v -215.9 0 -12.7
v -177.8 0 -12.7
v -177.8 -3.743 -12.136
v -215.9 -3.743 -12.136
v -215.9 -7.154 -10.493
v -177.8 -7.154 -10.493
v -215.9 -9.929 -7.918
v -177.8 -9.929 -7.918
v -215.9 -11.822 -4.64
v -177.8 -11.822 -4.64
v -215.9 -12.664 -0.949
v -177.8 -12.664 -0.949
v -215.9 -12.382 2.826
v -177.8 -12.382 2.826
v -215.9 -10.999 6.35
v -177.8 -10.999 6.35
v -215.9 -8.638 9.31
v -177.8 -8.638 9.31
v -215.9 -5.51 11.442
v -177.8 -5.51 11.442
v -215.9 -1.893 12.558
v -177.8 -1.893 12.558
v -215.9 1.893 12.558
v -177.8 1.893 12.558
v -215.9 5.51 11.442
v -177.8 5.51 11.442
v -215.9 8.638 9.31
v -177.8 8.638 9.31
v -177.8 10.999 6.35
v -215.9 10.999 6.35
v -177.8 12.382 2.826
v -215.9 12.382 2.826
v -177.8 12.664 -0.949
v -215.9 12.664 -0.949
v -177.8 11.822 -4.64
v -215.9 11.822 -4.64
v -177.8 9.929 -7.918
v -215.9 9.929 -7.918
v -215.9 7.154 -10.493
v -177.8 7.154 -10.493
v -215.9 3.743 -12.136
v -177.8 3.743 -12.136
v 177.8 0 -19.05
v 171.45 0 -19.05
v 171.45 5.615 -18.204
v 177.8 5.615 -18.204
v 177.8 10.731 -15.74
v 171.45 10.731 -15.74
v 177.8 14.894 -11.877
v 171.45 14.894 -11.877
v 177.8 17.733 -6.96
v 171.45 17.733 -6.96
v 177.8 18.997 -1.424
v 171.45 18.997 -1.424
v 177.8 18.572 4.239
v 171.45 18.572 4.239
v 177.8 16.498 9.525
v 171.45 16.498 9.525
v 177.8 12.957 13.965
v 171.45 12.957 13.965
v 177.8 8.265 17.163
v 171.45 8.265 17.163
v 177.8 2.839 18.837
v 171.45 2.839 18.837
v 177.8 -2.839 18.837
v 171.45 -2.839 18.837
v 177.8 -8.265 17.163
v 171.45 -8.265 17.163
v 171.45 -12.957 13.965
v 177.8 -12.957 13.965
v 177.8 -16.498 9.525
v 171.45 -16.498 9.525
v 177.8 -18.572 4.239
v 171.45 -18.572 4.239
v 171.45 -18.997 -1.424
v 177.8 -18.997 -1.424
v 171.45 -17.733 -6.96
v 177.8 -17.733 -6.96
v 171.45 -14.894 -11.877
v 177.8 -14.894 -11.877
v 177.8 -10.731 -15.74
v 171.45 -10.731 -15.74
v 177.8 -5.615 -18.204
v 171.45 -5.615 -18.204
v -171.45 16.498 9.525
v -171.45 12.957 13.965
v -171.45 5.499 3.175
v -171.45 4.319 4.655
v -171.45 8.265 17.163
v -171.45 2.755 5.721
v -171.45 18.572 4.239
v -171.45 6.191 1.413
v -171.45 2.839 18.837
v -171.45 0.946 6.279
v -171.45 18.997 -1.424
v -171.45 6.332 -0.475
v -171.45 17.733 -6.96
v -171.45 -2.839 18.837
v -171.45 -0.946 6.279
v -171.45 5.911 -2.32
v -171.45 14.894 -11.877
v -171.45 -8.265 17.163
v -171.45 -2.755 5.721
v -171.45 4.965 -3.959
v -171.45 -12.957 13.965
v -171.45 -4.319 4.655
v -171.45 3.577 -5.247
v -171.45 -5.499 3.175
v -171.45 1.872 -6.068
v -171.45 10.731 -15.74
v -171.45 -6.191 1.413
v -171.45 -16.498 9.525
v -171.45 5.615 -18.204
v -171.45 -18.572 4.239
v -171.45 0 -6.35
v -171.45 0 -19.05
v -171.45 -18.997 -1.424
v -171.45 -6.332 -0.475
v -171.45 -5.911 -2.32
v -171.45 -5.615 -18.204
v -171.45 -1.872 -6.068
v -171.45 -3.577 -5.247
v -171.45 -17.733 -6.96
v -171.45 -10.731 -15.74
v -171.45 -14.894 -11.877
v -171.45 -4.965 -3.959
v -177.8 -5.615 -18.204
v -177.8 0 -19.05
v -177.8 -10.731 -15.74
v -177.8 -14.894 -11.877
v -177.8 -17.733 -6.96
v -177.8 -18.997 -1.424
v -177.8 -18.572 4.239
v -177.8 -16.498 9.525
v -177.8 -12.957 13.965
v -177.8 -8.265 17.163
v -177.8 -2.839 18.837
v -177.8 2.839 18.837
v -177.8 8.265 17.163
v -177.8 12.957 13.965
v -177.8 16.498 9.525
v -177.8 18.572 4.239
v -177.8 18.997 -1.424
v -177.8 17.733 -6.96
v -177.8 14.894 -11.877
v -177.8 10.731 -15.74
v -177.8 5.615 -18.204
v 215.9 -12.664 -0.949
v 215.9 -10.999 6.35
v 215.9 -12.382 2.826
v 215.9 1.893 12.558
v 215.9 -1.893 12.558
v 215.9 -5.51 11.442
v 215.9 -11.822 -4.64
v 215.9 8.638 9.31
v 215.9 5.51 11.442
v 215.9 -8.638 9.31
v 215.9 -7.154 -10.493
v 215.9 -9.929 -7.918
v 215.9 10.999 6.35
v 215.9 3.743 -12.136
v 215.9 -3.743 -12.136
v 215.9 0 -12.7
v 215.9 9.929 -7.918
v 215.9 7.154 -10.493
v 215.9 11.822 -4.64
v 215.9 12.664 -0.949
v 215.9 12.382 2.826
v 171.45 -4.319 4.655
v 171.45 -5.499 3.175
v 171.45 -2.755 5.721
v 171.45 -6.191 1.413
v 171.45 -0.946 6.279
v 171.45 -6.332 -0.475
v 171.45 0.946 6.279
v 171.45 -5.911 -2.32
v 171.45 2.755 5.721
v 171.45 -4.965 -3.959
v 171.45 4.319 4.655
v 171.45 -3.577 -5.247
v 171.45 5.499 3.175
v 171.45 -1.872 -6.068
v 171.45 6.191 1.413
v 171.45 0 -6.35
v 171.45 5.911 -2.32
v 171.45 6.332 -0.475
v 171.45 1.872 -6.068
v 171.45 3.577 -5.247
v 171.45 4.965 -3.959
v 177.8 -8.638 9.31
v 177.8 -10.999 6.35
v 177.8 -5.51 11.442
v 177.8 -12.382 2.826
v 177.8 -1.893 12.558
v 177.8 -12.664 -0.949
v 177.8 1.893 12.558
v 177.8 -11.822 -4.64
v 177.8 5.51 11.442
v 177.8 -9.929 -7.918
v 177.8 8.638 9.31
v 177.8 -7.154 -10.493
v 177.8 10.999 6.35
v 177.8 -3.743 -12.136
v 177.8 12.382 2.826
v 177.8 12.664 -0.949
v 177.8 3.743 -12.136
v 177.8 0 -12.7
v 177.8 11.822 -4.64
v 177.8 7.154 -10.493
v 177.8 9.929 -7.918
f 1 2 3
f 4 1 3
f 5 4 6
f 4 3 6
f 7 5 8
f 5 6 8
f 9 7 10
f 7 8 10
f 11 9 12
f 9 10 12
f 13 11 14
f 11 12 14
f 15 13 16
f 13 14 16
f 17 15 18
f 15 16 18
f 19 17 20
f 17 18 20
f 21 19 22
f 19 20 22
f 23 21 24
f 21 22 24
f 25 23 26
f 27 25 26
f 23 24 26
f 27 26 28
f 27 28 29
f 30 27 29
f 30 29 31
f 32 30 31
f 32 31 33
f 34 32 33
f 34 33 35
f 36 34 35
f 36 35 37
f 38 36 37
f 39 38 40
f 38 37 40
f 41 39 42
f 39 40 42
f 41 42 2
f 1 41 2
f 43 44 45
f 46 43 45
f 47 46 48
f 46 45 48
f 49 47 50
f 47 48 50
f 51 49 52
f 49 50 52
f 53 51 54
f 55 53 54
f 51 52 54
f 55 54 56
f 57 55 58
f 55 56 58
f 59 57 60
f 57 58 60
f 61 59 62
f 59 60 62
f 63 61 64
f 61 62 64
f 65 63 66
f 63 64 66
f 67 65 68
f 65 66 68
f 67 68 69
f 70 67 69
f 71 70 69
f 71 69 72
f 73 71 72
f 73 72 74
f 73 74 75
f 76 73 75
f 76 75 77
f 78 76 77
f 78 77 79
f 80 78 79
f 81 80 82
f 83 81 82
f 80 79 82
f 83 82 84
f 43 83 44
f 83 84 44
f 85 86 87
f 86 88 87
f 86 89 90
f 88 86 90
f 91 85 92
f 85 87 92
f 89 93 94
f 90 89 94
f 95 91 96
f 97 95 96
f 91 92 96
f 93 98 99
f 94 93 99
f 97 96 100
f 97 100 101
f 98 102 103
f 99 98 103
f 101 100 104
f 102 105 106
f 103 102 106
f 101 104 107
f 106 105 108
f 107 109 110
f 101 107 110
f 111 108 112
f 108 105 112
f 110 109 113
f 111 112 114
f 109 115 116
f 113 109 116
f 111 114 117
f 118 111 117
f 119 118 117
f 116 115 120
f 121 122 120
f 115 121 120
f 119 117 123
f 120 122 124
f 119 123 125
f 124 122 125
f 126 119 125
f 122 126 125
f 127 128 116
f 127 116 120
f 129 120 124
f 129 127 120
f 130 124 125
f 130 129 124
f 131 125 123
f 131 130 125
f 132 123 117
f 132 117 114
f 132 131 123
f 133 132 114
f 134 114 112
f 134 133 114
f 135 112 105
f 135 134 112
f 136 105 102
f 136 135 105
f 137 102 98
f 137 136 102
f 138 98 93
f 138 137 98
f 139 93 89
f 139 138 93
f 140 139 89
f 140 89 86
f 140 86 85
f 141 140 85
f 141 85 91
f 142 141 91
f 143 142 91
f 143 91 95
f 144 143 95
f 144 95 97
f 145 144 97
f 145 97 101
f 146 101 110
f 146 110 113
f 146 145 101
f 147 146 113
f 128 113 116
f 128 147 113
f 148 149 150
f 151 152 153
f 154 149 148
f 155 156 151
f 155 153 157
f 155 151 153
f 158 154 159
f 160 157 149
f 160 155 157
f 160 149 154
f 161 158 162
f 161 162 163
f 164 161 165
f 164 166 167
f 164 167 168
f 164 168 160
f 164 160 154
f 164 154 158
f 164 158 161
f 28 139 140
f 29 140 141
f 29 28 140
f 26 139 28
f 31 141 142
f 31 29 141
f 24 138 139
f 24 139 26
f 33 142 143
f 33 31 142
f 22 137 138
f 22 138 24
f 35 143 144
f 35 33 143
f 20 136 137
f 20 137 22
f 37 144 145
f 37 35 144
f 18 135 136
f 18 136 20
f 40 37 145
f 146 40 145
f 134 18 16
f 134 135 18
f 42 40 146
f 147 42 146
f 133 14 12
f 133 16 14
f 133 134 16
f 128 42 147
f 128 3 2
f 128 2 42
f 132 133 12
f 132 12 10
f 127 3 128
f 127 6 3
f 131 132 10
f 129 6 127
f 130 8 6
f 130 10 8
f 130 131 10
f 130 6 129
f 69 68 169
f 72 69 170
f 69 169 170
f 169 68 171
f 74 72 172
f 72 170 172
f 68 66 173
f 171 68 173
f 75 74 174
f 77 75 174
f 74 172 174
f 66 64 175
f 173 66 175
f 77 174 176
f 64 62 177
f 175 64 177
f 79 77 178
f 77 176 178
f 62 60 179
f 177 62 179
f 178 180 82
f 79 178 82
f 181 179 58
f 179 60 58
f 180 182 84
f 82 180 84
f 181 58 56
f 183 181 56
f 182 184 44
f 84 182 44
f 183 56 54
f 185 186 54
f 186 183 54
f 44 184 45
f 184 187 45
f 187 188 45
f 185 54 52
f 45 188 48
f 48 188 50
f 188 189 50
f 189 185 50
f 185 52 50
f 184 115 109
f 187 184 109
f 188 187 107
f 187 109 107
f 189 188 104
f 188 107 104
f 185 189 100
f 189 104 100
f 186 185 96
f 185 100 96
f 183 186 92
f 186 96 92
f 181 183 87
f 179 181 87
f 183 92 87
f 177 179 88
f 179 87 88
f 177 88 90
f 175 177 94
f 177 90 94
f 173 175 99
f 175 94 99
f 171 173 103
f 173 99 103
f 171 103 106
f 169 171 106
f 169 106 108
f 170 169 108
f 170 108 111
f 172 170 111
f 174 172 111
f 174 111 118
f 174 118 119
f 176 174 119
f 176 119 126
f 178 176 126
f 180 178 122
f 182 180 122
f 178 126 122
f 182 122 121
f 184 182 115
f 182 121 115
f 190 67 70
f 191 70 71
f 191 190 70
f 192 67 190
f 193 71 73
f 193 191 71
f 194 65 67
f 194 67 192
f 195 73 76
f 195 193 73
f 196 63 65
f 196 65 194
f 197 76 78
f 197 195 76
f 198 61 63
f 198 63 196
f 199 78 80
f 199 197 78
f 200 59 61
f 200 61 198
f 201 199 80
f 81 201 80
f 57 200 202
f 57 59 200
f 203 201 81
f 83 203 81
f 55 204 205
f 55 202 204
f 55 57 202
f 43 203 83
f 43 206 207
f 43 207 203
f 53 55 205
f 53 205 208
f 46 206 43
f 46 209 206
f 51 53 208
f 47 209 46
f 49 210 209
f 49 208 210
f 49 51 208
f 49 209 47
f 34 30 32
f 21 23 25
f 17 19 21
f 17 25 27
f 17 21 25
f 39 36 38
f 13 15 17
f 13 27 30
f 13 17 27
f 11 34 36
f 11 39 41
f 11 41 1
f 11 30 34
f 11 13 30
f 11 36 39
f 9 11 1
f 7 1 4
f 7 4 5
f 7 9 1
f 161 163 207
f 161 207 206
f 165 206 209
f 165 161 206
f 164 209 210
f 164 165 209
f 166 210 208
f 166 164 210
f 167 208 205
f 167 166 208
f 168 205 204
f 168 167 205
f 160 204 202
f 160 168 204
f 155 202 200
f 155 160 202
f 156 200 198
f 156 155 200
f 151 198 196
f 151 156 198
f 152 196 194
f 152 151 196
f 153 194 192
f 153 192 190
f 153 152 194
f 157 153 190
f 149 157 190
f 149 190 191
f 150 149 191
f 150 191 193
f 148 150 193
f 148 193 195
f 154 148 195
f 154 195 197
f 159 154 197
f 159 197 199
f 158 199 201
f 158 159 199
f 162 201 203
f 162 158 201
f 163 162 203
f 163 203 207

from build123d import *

# Parameters (mm, degrees)
BOSS_EXTRUDE1_DEPTH      = 171.45
BOSS_EXTRUDE1_DEPTH_BACK = 171.45
SKETCH2_R                = 6.35
SKETCH3_R                = 19.05
BOSS_EXTRUDE2_DEPTH      = 6.35
BOSS_EXTRUDE4_START      = 6.35
SKETCH7_R                = 19.05
BOSS_EXTRUDE4_DEPTH      = 6.35
SKETCH9_R                = 12.7
BOSS_EXTRUDE6_DEPTH      = 38.1
BOSS_EXTRUDE7_START      = 38.1
SKETCH10_R               = 12.7
BOSS_EXTRUDE7_DEPTH      = 38.1


with BuildPart() as part:
    # Sketch2 → Boss-Extrude1 (new, two sides: drawn at the far end of the back side and taken through both)
    with BuildSketch(Plane(origin=(0, 0, 0), x_dir=(0, 0, -1), z_dir=(1, 0, 0)).offset(-BOSS_EXTRUDE1_DEPTH_BACK)):
        Circle(SKETCH2_R)
    extrude(amount=BOSS_EXTRUDE1_DEPTH + BOSS_EXTRUDE1_DEPTH_BACK)

    # Sketch3 → Boss-Extrude2 (add)
    with BuildSketch(Plane(origin=(171.45, 0, 0), x_dir=(0, 0, -1), z_dir=(1, 0, 0))):
        Circle(SKETCH3_R)
    extrude(amount=BOSS_EXTRUDE2_DEPTH)

    # Sketch7 → Boss-Extrude4 (add)
    with BuildSketch(Plane.ZY.offset(171.45).offset(BOSS_EXTRUDE4_START)):
        Circle(SKETCH7_R)
    extrude(amount=-BOSS_EXTRUDE4_DEPTH)

    # Sketch9 → Boss-Extrude6 (add)
    with BuildSketch(Plane.ZY.offset(177.8)):
        Circle(SKETCH9_R)
    extrude(amount=BOSS_EXTRUDE6_DEPTH)

    # Sketch10 → Boss-Extrude7 (add)
    with BuildSketch(Plane(origin=(177.8, 0, 0), x_dir=(0, 0, -1), z_dir=(1, 0, 0)).offset(BOSS_EXTRUDE7_START)):
        Circle(SKETCH10_R)
    extrude(amount=-BOSS_EXTRUDE7_DEPTH)


solid = part.part
